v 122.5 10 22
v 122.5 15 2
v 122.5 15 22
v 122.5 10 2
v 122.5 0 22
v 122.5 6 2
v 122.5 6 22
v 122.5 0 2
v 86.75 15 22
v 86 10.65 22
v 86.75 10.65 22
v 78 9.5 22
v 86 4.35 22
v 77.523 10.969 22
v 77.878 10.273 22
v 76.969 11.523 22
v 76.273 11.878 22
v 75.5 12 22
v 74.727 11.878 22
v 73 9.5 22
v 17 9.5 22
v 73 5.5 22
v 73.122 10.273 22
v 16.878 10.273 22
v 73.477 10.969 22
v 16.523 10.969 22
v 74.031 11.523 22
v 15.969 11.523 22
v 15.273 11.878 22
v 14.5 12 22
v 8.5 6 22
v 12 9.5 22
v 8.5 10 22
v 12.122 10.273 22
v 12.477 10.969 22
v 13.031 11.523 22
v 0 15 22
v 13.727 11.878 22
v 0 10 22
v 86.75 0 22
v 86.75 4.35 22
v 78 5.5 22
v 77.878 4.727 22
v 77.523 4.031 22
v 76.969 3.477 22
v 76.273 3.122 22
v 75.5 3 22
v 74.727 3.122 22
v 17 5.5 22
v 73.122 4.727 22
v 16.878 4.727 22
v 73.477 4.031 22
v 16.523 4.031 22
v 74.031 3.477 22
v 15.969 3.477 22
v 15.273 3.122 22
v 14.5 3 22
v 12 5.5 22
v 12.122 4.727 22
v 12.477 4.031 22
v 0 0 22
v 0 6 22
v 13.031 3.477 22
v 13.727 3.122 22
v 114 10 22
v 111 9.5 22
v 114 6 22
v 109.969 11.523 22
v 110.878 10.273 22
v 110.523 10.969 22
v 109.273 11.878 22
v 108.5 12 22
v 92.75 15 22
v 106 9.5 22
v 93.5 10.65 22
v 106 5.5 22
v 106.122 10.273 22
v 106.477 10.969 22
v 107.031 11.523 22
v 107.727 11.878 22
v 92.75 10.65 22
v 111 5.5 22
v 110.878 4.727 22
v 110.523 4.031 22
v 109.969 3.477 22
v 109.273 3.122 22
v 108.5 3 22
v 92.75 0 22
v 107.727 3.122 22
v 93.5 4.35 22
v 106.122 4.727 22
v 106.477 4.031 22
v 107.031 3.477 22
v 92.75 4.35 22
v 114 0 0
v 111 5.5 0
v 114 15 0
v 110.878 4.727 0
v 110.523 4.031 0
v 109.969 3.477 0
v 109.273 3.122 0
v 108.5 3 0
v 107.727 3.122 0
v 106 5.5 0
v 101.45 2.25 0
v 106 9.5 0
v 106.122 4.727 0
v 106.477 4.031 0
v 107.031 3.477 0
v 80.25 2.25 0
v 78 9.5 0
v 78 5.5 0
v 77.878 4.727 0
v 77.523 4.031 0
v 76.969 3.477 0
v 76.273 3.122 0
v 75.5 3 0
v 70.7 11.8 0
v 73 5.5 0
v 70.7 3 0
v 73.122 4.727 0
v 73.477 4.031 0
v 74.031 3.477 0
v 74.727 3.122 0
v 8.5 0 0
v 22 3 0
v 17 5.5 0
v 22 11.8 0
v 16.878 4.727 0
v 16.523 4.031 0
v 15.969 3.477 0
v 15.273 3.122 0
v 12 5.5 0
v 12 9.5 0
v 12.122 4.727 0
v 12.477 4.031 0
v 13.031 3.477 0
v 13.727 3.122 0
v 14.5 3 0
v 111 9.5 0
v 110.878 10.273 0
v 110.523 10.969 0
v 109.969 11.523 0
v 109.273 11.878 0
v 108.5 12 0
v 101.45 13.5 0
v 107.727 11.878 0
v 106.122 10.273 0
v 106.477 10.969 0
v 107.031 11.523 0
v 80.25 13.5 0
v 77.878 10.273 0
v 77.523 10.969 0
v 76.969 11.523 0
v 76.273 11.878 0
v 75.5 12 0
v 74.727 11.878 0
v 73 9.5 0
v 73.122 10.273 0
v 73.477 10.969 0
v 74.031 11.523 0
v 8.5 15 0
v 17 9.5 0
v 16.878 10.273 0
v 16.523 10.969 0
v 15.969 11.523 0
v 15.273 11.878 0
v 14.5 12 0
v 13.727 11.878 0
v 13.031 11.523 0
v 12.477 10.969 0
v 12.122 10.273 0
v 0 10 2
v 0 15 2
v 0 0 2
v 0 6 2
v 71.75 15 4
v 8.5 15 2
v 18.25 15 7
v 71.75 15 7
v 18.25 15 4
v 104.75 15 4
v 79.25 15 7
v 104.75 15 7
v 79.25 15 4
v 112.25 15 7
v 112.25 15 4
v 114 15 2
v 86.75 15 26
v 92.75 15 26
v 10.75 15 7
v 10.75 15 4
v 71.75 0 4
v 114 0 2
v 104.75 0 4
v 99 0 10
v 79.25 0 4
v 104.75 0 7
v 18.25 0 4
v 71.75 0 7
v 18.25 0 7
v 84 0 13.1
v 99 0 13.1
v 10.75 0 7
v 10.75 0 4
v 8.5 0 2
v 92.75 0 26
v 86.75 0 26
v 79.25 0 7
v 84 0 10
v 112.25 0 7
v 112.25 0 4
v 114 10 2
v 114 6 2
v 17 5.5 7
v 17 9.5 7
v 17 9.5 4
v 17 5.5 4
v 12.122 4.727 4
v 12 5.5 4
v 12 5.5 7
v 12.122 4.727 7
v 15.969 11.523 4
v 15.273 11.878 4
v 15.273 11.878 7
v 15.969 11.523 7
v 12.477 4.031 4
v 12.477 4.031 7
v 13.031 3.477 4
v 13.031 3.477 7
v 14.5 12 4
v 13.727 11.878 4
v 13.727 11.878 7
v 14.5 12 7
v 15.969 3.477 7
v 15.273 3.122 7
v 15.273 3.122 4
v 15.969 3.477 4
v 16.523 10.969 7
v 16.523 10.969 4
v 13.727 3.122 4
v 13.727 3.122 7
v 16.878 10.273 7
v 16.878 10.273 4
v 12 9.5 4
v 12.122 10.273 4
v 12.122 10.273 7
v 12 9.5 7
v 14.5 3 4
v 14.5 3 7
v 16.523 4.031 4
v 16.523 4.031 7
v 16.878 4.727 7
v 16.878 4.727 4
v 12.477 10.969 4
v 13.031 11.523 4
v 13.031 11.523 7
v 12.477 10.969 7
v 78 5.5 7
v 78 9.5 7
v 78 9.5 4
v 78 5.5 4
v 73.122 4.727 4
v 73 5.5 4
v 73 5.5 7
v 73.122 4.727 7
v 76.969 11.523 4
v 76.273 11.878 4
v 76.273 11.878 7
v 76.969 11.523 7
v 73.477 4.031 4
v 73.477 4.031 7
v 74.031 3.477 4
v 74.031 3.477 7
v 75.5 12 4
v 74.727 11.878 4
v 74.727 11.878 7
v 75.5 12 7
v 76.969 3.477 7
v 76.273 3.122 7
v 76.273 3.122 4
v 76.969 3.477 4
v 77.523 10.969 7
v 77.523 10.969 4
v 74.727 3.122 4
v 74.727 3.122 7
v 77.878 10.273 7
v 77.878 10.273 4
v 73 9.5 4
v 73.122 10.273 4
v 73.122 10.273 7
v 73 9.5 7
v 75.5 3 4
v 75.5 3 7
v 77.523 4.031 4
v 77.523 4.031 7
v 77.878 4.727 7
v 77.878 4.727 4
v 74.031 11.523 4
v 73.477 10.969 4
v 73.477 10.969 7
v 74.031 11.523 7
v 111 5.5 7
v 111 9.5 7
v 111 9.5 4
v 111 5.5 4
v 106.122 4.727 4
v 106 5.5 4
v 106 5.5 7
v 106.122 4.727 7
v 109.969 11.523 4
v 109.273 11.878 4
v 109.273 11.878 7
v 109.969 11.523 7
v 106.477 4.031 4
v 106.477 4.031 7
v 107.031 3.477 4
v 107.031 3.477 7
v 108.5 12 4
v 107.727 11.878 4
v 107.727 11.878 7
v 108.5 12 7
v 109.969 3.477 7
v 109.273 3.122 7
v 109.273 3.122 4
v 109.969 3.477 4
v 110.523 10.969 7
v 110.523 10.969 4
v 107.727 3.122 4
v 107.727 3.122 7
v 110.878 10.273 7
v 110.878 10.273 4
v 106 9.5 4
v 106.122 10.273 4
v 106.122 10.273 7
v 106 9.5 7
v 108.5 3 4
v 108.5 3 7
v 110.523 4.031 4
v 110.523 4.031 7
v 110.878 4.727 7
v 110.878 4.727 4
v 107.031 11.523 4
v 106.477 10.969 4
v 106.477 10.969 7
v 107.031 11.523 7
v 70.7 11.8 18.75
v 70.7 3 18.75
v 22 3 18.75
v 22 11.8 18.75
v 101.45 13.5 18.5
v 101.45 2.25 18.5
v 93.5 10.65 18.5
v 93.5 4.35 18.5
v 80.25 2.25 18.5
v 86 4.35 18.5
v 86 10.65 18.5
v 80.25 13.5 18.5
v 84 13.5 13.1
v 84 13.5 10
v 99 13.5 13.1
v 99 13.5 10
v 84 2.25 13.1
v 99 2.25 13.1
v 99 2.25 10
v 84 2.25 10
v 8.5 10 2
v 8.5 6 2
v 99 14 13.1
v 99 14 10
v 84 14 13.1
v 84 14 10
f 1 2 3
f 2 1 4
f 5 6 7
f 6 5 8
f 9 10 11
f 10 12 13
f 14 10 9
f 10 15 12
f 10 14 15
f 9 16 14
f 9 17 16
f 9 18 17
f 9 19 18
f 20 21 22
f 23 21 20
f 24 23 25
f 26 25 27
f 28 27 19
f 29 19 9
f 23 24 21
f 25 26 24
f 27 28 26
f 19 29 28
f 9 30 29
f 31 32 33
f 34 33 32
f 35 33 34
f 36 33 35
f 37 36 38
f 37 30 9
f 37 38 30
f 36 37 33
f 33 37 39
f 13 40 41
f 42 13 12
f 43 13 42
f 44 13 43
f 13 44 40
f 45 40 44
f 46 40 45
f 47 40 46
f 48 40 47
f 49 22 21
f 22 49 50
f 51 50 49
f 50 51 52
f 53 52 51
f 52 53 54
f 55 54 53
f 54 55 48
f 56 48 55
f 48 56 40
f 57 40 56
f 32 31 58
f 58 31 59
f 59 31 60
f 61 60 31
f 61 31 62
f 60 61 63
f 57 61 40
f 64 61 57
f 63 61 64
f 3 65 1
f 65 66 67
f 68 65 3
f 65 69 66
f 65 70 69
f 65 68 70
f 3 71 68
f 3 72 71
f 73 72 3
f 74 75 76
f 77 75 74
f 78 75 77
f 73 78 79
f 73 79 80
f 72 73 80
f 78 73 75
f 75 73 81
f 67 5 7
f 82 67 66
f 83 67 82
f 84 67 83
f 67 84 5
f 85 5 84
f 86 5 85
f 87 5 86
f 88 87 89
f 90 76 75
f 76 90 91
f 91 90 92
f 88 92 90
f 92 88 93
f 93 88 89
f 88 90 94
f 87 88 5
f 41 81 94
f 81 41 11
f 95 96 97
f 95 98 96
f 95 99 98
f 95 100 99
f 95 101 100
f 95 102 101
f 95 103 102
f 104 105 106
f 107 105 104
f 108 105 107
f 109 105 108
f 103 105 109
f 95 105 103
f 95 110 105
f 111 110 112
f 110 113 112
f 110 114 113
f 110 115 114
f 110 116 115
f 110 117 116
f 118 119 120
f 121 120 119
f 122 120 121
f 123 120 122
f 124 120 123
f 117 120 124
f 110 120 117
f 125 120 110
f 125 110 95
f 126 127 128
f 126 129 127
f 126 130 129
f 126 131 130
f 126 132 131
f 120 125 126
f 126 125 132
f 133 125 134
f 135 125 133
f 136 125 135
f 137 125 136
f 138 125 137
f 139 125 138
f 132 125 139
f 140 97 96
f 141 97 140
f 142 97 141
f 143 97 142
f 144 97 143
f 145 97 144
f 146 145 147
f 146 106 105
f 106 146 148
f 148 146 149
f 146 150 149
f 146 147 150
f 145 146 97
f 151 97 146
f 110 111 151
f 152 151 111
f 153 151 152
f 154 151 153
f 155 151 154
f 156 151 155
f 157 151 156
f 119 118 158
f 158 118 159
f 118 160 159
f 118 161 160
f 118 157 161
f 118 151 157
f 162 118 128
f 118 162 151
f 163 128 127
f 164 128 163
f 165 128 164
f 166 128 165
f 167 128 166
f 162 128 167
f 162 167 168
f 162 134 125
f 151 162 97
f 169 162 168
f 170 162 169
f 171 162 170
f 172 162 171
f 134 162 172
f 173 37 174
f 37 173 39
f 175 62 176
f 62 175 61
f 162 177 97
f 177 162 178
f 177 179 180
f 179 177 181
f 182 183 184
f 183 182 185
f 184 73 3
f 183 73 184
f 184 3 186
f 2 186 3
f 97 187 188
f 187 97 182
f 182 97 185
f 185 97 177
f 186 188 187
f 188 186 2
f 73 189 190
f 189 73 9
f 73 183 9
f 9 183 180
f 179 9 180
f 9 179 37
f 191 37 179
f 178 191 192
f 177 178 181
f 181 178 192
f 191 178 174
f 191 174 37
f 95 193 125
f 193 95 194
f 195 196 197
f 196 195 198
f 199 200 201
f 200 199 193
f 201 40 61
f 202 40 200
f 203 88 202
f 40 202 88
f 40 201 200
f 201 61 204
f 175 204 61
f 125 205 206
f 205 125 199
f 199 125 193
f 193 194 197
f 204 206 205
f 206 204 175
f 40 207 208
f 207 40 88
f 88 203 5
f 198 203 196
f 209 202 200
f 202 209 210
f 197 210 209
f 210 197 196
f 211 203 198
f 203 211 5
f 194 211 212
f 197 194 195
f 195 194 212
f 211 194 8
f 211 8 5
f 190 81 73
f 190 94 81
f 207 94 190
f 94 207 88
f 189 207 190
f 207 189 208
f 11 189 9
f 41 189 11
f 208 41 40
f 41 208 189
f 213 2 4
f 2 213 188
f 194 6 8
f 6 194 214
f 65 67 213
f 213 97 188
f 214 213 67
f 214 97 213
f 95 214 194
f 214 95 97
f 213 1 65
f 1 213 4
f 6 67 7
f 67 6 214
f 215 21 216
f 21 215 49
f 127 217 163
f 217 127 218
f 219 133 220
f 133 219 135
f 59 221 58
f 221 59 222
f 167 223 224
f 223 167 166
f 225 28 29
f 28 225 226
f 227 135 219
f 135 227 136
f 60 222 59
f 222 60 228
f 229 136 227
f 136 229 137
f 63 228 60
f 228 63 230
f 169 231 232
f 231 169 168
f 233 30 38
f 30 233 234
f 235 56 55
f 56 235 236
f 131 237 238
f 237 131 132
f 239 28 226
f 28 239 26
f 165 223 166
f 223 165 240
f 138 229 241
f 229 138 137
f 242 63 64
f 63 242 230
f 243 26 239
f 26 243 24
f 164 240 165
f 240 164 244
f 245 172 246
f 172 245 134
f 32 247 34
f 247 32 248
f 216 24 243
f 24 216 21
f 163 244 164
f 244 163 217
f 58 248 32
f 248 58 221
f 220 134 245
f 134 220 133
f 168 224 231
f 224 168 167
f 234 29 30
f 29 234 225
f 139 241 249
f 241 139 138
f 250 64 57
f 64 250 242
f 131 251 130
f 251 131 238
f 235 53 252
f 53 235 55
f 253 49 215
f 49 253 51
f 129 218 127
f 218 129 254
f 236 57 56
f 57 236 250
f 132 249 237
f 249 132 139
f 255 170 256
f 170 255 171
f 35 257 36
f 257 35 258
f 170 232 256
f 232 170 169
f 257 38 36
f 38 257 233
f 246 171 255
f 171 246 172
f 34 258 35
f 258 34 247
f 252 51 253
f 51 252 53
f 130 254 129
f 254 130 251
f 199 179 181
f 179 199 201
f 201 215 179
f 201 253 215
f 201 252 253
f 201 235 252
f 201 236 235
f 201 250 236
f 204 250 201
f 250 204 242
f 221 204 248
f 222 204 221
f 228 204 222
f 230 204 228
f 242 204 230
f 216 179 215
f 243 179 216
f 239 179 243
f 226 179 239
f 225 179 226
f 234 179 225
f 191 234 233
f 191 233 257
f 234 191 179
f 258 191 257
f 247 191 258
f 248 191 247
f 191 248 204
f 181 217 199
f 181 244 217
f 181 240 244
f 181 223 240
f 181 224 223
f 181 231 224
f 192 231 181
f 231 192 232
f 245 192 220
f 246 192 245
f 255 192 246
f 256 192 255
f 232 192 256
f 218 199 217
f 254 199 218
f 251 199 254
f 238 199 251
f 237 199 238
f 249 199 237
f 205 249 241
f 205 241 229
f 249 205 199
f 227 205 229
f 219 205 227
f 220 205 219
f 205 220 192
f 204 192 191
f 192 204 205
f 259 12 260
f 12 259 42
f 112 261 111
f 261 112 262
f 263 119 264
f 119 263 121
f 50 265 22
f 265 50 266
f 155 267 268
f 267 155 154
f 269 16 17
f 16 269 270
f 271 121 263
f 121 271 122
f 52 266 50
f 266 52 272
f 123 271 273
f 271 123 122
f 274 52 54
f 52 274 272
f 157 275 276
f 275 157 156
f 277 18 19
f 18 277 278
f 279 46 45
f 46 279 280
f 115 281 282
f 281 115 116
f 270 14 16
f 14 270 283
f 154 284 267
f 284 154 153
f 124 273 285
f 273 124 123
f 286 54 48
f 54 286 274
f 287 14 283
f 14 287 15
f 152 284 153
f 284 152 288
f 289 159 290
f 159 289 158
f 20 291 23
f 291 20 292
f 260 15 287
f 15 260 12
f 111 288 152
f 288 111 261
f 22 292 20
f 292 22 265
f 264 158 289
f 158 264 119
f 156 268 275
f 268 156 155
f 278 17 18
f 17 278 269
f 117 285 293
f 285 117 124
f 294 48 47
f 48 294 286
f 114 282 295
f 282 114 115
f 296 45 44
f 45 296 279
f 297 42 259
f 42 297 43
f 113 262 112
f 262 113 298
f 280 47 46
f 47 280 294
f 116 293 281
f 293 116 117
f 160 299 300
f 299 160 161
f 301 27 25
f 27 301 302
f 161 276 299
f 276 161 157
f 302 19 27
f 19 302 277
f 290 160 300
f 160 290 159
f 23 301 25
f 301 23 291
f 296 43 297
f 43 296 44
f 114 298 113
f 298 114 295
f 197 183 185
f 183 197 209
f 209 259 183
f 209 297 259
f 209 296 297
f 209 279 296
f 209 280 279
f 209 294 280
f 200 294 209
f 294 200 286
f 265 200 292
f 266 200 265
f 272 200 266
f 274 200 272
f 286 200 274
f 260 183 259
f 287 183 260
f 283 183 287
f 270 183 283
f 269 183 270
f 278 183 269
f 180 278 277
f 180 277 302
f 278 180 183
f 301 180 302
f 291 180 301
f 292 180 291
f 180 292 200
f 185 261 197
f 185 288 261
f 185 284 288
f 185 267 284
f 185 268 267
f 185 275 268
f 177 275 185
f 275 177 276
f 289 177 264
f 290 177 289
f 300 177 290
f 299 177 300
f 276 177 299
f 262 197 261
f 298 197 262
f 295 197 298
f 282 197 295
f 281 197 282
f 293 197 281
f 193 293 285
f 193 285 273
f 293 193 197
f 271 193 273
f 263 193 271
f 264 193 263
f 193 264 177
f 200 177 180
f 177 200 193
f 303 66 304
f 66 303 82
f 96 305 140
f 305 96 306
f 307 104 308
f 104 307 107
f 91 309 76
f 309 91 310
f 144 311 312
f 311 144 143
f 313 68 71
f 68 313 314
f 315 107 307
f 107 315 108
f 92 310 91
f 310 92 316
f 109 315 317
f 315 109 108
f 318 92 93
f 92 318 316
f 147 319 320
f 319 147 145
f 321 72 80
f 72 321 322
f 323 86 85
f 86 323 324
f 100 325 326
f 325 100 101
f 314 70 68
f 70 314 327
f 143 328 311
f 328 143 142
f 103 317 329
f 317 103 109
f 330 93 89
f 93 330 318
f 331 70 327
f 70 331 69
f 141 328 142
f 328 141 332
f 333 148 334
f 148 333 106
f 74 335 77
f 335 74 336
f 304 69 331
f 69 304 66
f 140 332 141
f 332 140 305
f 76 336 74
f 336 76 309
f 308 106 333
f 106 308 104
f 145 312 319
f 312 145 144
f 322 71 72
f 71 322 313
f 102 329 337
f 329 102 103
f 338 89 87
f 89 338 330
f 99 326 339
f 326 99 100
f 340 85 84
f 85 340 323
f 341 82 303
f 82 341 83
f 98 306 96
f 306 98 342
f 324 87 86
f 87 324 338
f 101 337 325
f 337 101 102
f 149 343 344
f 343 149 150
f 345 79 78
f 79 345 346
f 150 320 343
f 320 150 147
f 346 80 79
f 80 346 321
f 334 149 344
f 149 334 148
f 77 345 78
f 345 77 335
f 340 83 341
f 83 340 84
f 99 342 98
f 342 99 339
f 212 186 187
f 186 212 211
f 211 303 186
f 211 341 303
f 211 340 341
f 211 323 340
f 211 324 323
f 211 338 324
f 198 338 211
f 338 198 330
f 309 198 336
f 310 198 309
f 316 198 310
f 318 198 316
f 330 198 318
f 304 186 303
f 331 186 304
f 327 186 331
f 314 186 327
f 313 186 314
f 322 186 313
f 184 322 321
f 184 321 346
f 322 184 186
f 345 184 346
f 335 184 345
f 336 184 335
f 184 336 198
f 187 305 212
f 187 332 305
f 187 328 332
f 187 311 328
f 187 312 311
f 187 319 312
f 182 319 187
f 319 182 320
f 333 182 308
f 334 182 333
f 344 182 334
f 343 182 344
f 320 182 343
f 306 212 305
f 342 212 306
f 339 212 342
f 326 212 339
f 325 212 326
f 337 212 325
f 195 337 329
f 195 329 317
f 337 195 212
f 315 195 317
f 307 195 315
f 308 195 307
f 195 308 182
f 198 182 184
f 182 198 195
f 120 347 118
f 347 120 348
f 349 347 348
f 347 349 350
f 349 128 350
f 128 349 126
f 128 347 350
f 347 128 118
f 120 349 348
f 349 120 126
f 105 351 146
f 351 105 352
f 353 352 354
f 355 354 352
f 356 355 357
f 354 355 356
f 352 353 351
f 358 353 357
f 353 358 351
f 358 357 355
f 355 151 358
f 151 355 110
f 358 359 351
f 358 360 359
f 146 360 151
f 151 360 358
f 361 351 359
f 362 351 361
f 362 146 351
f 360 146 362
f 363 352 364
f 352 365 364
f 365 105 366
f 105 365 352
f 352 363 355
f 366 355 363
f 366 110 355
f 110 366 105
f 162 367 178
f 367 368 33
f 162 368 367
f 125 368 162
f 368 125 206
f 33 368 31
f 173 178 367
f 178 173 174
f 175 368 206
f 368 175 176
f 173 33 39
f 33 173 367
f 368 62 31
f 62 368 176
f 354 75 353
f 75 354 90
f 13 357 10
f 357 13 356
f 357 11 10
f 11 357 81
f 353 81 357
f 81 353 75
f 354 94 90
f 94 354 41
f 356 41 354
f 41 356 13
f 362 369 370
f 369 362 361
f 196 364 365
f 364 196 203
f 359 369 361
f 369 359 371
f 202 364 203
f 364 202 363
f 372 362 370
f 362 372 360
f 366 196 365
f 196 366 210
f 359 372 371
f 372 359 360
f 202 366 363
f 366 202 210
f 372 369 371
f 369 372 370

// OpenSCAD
module verschraubungsloch() {
	hull() {
		translate([0, 5.5, 0])
			cylinder(h = 22, r = 2.5, $fn = 20);

		translate([0, 9.5, 0])
			cylinder(h = 22, r = 2.5, $fn = 20);

	}
	translate([-3.75, 0, 4])
	cube ([7.5, 15 ,3]);
}

difference() {
	union() {
		cube(size = [122.5,15,22]);
	
		// Befestigung für Schalter
		translate([86.75, 0, 22])
			cube([6, 15, 4]);
	}

	// Grosser Haken
	translate([22, 3, 0])
	cube(size = [48.7, 8.8, 18.75]);

	// Kleiner Bolzen
	translate([80.25, 2.25, 0])
	cube(size = [21.2, 11.25, 18.5]);

	// Nuten an den Enden zur Justierung
	cube([8.5, 15, 2]);
	translate([0, 6, 0])
		cube([8.5, 4, 22]);

	translate([114, 0, 0]) {
		cube([8.5, 15, 2]);
		translate([0, 6, 0])
			cube([8.5, 4, 22]);
	}

	// Verschraubungslöcher
	translate([14.5, 0, 0]) verschraubungsloch();
	translate([75.5, 0, 0]) verschraubungsloch();
	translate([108.5, 0, 0]) verschraubungsloch();

	// Loch für Schalter
	translate([86, 4.35, 18.5])
		cube([7.5, 6.3, 3.5]);

	// Loch für Gummiband.
	translate([84, -1, 10])
		cube([15, 15, 3.1]);
}
